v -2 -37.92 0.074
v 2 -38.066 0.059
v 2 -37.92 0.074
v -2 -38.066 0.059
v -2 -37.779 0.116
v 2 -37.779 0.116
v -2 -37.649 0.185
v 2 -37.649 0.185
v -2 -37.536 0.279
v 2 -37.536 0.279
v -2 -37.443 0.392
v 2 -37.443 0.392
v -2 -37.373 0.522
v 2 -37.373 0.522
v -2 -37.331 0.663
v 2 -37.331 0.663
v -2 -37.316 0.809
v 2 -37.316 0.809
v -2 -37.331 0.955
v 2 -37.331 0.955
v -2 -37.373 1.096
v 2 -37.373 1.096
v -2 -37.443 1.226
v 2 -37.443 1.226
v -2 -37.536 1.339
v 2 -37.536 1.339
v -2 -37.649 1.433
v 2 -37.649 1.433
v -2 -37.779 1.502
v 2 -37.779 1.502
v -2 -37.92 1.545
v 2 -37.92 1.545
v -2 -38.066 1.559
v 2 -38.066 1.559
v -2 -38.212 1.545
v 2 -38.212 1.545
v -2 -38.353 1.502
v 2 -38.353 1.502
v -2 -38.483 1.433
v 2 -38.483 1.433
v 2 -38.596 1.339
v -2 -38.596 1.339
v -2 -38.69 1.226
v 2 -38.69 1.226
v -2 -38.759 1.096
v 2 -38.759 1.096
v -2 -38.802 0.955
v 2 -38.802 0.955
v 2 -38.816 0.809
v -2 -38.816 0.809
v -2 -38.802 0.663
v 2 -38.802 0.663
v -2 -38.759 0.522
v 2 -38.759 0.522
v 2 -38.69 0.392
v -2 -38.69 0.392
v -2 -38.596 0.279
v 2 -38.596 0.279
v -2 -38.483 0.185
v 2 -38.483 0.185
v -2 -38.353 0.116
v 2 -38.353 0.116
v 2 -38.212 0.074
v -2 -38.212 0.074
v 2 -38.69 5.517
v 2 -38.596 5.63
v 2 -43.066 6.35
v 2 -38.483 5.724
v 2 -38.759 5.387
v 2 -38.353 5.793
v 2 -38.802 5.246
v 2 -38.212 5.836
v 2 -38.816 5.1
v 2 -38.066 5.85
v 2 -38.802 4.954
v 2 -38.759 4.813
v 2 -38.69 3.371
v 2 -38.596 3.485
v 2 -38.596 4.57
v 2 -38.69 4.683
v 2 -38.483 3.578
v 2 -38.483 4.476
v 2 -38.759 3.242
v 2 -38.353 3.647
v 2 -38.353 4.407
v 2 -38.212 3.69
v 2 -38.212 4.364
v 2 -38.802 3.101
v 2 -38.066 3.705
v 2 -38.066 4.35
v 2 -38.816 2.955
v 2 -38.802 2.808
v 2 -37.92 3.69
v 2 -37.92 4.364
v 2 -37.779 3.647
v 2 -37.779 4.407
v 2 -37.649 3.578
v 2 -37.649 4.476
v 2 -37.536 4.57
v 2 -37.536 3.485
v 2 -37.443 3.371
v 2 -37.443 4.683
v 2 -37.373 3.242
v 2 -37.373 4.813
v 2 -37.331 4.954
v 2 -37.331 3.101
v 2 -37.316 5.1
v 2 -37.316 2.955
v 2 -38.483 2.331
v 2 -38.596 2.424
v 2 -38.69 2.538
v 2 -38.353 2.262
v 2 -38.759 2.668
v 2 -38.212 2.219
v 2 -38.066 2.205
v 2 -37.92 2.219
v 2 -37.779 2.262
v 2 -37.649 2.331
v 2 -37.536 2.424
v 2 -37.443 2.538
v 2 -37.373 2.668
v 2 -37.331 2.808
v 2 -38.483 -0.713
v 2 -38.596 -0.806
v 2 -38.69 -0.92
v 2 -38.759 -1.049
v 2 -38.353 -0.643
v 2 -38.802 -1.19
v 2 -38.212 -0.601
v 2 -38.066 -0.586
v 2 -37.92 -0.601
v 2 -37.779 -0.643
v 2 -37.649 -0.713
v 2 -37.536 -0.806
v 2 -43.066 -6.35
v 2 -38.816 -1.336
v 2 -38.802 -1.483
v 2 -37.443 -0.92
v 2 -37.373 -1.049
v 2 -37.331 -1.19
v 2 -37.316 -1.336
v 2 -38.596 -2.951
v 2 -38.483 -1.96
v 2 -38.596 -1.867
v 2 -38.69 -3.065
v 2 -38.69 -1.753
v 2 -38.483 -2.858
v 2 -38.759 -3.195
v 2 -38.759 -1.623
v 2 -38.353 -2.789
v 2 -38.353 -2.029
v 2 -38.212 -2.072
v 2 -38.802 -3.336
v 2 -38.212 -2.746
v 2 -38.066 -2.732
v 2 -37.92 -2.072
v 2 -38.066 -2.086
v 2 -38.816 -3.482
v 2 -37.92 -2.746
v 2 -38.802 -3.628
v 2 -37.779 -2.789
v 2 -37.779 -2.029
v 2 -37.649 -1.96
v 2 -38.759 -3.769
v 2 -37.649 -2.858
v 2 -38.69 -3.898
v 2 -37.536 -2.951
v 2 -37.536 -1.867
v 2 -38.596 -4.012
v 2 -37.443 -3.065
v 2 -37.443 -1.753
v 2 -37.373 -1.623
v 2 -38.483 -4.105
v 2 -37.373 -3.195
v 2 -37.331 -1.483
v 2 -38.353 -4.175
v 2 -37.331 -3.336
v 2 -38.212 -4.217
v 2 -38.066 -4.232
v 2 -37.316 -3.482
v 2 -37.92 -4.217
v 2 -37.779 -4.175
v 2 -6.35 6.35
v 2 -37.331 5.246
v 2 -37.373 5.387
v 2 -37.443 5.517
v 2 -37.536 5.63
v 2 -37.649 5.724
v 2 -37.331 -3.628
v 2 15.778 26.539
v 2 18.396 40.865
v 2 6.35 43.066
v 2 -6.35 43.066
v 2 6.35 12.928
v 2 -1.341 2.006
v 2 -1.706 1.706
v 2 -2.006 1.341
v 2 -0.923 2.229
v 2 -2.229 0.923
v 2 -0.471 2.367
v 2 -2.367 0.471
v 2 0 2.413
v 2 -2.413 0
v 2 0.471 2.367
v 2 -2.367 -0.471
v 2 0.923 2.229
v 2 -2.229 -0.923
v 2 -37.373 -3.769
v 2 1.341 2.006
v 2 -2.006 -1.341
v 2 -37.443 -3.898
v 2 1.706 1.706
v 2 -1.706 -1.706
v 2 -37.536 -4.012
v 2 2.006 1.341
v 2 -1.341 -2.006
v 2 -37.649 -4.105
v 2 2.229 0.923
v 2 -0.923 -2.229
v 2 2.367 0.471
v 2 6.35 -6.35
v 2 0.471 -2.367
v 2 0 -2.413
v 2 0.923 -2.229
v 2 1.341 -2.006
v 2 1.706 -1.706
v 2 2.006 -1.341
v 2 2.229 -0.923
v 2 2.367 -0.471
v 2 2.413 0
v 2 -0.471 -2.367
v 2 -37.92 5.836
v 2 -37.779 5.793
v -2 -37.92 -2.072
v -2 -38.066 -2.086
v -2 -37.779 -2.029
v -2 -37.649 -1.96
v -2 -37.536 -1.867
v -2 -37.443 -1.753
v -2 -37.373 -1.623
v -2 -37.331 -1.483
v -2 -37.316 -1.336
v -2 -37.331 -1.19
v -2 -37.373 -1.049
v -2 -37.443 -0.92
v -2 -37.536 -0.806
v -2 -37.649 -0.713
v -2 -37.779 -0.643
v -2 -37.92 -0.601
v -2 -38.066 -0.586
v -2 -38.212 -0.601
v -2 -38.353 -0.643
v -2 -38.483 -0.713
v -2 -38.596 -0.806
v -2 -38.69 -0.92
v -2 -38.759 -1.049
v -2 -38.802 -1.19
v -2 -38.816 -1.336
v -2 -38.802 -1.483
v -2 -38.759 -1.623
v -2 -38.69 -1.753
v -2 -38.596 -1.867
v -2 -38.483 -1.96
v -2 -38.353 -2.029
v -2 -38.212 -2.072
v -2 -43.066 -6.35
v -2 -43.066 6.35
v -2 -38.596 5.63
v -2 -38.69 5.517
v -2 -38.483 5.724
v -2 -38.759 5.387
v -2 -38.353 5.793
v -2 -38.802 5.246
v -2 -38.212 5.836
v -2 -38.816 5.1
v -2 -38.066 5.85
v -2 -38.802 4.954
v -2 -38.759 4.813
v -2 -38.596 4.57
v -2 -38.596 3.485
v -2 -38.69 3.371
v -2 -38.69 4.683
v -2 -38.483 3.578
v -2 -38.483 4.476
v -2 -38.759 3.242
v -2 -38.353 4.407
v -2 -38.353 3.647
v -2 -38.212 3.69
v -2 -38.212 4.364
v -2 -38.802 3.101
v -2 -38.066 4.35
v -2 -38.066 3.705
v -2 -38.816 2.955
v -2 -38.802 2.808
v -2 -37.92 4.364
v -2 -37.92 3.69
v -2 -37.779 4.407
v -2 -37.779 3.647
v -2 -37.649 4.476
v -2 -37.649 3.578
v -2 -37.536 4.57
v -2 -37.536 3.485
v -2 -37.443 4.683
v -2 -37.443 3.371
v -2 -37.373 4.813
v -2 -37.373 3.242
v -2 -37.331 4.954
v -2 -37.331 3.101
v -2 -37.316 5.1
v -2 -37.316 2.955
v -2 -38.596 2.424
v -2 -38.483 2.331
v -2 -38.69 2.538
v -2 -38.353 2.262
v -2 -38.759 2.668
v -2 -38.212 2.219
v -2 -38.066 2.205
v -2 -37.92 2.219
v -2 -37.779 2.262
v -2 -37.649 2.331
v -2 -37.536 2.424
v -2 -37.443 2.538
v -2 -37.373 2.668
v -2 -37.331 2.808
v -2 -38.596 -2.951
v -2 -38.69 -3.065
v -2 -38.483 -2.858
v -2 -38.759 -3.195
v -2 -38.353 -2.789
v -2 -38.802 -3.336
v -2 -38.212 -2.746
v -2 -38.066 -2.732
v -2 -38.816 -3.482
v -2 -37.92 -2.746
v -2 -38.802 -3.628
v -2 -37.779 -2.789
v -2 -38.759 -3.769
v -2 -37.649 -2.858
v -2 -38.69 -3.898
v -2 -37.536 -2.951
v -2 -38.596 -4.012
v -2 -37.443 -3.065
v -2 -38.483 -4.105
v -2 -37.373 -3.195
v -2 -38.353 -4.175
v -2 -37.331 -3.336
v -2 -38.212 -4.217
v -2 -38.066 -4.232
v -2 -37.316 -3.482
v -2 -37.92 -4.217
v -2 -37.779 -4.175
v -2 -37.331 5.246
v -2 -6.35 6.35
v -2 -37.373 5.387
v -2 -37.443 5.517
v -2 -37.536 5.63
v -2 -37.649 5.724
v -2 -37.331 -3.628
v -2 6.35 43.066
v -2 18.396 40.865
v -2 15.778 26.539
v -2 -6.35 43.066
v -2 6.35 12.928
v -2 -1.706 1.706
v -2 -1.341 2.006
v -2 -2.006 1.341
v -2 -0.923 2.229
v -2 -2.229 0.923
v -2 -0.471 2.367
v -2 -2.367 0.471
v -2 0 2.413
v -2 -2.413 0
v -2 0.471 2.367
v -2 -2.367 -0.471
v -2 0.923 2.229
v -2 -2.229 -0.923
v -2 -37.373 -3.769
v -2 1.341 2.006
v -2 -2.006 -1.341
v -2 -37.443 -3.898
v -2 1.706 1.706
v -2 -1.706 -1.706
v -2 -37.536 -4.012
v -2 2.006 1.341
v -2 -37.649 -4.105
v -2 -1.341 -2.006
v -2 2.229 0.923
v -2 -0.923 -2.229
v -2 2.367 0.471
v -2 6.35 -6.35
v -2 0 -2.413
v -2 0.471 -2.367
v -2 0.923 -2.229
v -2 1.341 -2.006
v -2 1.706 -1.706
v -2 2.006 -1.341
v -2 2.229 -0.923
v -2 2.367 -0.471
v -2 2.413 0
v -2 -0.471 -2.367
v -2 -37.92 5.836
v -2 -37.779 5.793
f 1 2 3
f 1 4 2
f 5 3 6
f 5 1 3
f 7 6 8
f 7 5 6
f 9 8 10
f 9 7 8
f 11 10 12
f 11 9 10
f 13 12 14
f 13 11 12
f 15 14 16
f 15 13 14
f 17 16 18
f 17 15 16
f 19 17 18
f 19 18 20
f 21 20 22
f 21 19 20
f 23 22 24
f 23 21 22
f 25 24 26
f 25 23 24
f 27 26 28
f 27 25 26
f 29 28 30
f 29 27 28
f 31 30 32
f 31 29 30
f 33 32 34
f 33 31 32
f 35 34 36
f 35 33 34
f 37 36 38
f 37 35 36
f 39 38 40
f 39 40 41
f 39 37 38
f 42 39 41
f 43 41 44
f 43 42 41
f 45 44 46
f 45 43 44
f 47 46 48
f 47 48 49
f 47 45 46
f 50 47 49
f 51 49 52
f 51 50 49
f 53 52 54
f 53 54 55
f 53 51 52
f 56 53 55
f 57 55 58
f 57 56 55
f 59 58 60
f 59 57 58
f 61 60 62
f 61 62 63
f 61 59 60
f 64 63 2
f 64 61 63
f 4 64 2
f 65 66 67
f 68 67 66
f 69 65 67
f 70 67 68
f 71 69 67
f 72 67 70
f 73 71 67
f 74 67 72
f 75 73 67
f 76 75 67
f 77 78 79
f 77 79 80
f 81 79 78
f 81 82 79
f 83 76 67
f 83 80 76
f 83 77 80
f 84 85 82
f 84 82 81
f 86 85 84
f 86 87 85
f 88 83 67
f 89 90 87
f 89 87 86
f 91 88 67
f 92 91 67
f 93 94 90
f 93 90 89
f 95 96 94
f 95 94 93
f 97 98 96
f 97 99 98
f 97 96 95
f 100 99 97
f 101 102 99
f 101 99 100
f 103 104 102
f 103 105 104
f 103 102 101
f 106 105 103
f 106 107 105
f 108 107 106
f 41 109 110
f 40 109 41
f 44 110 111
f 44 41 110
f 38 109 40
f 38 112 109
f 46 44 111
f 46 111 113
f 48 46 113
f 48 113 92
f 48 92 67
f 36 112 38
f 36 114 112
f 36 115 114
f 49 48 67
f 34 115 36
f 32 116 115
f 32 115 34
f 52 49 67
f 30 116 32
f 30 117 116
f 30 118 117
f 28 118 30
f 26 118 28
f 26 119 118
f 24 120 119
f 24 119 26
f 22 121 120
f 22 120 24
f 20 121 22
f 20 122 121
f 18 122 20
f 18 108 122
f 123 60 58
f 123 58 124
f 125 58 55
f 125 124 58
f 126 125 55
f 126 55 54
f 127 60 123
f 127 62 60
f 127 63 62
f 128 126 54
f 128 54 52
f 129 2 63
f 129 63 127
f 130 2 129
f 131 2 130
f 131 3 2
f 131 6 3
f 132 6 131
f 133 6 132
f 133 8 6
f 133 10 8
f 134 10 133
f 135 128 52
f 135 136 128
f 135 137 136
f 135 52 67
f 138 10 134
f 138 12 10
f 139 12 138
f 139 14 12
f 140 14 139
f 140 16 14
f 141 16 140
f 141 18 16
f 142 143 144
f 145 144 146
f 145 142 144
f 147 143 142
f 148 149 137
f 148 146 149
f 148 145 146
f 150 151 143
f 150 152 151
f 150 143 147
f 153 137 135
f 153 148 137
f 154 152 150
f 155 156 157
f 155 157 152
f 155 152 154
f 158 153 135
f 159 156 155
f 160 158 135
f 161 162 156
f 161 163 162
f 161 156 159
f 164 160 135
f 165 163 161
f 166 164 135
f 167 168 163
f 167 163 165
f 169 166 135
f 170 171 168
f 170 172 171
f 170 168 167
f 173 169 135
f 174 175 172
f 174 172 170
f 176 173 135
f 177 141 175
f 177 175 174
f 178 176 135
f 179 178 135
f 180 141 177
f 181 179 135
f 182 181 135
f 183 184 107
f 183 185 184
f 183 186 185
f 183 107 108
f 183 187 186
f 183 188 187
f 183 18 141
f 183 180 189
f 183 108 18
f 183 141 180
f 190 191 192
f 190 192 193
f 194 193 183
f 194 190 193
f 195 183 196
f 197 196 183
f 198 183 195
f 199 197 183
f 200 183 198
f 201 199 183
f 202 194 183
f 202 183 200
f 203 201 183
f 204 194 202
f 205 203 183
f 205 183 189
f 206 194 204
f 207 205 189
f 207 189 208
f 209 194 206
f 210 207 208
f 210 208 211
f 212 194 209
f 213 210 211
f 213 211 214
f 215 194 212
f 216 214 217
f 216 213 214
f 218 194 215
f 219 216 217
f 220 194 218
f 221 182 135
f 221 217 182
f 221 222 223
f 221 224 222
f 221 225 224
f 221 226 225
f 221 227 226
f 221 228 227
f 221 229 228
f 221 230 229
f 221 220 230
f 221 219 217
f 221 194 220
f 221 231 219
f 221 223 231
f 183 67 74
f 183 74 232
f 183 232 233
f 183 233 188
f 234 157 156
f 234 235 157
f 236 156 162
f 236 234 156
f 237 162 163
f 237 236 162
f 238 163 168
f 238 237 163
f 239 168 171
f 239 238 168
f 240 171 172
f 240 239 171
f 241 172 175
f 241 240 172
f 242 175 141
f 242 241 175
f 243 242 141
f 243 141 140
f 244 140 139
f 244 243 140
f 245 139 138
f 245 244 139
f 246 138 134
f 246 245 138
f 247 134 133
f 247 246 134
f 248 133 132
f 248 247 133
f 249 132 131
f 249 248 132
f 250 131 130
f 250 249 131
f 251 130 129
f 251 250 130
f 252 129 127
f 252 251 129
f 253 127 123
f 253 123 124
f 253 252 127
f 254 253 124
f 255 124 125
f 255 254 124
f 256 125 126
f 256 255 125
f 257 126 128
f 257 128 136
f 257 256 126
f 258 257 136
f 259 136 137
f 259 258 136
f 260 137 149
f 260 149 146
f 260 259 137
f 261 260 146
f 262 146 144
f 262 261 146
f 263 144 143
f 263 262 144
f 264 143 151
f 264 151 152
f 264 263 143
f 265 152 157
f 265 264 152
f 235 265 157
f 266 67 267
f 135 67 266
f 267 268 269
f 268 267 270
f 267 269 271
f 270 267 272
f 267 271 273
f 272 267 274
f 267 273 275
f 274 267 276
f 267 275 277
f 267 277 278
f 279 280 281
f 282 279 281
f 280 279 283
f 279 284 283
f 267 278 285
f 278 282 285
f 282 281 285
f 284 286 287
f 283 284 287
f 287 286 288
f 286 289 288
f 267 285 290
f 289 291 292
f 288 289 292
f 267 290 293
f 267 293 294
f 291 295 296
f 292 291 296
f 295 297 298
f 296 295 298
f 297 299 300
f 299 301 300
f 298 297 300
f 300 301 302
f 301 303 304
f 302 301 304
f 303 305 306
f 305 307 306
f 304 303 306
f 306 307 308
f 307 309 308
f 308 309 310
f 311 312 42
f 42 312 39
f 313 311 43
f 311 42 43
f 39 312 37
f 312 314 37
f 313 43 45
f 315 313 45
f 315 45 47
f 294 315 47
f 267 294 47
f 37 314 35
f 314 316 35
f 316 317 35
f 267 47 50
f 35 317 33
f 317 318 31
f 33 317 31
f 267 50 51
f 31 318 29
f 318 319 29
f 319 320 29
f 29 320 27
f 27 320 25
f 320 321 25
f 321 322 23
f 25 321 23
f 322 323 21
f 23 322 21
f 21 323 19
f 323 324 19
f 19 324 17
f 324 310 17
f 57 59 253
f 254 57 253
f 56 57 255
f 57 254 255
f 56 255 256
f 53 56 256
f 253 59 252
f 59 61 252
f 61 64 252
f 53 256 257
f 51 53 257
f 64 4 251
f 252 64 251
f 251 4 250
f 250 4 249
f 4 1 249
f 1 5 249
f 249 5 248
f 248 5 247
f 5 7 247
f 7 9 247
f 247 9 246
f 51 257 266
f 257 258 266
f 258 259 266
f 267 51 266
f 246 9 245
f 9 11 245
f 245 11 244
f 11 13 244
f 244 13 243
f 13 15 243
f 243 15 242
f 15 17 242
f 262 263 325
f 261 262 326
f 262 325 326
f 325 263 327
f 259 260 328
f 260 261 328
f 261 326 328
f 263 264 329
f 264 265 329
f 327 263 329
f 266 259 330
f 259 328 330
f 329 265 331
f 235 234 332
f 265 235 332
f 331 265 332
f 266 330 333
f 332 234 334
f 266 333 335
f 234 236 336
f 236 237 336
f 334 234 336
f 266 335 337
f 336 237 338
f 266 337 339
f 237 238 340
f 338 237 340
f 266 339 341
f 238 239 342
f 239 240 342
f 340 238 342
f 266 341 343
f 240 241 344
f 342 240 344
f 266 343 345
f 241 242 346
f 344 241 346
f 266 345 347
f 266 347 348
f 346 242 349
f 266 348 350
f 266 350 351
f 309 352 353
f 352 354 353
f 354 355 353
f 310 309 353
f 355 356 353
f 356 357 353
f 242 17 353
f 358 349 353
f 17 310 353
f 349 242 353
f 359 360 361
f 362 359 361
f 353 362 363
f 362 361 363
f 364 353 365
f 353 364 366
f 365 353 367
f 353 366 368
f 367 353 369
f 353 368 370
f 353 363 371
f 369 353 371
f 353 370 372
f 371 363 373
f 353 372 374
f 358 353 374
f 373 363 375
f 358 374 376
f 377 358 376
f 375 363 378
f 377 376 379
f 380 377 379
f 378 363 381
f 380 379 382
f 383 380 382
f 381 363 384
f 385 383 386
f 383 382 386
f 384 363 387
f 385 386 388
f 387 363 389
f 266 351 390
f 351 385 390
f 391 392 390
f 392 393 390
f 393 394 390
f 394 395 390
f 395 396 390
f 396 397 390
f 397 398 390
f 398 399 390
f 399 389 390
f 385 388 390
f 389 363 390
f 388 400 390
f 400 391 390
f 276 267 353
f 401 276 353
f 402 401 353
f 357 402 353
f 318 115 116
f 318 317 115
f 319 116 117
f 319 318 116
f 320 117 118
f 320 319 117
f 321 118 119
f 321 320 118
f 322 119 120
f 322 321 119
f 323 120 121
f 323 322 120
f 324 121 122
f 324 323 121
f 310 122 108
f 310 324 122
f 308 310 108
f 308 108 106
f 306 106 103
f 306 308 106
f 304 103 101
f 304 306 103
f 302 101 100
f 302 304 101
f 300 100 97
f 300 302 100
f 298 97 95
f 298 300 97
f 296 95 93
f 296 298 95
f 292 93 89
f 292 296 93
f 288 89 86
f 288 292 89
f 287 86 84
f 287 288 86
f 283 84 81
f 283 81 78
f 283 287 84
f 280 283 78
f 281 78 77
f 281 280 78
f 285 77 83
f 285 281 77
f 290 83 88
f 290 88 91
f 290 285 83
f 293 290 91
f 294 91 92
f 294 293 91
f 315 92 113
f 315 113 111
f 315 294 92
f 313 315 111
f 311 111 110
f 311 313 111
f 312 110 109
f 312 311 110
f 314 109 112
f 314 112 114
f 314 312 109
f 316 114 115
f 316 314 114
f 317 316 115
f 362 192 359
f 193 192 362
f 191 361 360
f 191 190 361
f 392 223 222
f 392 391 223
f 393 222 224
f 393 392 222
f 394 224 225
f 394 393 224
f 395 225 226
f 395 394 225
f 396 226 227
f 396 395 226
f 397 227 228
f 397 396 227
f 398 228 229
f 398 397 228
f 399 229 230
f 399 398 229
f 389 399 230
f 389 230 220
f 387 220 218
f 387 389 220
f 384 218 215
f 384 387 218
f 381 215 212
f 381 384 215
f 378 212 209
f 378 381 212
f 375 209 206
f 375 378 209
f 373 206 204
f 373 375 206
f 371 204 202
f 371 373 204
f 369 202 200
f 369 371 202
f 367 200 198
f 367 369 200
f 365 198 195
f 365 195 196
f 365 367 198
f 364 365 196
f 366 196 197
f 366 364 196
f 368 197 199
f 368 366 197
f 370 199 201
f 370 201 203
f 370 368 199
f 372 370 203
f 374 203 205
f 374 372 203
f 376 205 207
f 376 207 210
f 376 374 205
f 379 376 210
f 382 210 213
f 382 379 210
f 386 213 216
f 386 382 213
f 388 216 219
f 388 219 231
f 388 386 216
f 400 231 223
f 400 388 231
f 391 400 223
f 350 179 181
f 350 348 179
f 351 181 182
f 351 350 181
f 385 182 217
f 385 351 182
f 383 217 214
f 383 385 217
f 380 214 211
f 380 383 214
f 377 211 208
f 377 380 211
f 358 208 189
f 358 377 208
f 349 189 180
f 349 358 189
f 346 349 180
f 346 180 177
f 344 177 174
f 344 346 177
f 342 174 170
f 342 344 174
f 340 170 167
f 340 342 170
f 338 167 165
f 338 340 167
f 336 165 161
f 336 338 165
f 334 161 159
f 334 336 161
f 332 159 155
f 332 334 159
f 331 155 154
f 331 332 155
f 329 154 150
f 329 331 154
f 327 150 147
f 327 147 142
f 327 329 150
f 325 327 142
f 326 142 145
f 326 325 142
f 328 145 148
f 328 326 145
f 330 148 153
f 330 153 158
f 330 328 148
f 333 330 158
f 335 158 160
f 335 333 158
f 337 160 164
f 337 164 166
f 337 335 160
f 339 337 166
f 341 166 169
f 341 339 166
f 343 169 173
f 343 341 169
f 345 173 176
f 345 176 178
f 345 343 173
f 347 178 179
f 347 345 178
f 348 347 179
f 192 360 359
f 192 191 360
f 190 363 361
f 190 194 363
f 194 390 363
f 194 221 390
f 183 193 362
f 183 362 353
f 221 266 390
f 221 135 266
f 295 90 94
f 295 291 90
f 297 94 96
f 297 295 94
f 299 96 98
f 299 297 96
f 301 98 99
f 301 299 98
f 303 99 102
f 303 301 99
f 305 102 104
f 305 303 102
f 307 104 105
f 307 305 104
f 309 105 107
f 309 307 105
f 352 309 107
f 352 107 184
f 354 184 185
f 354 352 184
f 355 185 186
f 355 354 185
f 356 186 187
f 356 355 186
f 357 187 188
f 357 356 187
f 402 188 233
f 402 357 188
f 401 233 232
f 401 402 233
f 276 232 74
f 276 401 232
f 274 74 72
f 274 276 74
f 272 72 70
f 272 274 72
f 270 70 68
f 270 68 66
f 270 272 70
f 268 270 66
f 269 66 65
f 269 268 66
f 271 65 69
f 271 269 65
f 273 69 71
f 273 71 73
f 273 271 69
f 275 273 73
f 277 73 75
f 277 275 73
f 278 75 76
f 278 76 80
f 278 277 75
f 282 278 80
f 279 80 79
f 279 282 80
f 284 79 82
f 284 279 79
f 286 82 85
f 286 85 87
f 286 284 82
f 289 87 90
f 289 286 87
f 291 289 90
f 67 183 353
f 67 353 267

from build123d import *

# Parameters (mm, degrees)
SKETCH1_R           = 2.413
SKETCH1_R_2         = 0.75
BOSS_EXTRUDE1_DEPTH = 2


with BuildPart() as part:
    # Sketch1 → Boss-Extrude1 (new, symmetric)
    with BuildSketch(Plane(origin=(0, 0, 0), x_dir=(0, 0, -1), z_dir=(1, 0, 0))):
        Polygon((-40.864531886, 18.395870563), (-43.06614877, 6.35), (-43.06614877, -6.35), (-6.35, -6.35), (-6.35, -43.06614877), (6.35, -43.06614877), (6.35, 6.35), (-12.928006667, 6.35), (-26.539165493, 15.777631529), align=None)
        Circle(SKETCH1_R, mode=Mode.SUBTRACT)
        with Locations((3.481818182, -38.06614877)):
            Circle(SKETCH1_R_2, mode=Mode.SUBTRACT)
        with Locations((1.336363636, -38.06614877)):
            Circle(SKETCH1_R_2, mode=Mode.SUBTRACT)
        with Locations((-5.1, -38.06614877)):
            Circle(SKETCH1_R_2, mode=Mode.SUBTRACT)
        with Locations((-2.954545455, -38.06614877)):
            Circle(SKETCH1_R_2, mode=Mode.SUBTRACT)
        with Locations((-0.809090909, -38.06614877)):
            Circle(SKETCH1_R_2, mode=Mode.SUBTRACT)
    extrude(amount=BOSS_EXTRUDE1_DEPTH, both=True)


solid = part.part
